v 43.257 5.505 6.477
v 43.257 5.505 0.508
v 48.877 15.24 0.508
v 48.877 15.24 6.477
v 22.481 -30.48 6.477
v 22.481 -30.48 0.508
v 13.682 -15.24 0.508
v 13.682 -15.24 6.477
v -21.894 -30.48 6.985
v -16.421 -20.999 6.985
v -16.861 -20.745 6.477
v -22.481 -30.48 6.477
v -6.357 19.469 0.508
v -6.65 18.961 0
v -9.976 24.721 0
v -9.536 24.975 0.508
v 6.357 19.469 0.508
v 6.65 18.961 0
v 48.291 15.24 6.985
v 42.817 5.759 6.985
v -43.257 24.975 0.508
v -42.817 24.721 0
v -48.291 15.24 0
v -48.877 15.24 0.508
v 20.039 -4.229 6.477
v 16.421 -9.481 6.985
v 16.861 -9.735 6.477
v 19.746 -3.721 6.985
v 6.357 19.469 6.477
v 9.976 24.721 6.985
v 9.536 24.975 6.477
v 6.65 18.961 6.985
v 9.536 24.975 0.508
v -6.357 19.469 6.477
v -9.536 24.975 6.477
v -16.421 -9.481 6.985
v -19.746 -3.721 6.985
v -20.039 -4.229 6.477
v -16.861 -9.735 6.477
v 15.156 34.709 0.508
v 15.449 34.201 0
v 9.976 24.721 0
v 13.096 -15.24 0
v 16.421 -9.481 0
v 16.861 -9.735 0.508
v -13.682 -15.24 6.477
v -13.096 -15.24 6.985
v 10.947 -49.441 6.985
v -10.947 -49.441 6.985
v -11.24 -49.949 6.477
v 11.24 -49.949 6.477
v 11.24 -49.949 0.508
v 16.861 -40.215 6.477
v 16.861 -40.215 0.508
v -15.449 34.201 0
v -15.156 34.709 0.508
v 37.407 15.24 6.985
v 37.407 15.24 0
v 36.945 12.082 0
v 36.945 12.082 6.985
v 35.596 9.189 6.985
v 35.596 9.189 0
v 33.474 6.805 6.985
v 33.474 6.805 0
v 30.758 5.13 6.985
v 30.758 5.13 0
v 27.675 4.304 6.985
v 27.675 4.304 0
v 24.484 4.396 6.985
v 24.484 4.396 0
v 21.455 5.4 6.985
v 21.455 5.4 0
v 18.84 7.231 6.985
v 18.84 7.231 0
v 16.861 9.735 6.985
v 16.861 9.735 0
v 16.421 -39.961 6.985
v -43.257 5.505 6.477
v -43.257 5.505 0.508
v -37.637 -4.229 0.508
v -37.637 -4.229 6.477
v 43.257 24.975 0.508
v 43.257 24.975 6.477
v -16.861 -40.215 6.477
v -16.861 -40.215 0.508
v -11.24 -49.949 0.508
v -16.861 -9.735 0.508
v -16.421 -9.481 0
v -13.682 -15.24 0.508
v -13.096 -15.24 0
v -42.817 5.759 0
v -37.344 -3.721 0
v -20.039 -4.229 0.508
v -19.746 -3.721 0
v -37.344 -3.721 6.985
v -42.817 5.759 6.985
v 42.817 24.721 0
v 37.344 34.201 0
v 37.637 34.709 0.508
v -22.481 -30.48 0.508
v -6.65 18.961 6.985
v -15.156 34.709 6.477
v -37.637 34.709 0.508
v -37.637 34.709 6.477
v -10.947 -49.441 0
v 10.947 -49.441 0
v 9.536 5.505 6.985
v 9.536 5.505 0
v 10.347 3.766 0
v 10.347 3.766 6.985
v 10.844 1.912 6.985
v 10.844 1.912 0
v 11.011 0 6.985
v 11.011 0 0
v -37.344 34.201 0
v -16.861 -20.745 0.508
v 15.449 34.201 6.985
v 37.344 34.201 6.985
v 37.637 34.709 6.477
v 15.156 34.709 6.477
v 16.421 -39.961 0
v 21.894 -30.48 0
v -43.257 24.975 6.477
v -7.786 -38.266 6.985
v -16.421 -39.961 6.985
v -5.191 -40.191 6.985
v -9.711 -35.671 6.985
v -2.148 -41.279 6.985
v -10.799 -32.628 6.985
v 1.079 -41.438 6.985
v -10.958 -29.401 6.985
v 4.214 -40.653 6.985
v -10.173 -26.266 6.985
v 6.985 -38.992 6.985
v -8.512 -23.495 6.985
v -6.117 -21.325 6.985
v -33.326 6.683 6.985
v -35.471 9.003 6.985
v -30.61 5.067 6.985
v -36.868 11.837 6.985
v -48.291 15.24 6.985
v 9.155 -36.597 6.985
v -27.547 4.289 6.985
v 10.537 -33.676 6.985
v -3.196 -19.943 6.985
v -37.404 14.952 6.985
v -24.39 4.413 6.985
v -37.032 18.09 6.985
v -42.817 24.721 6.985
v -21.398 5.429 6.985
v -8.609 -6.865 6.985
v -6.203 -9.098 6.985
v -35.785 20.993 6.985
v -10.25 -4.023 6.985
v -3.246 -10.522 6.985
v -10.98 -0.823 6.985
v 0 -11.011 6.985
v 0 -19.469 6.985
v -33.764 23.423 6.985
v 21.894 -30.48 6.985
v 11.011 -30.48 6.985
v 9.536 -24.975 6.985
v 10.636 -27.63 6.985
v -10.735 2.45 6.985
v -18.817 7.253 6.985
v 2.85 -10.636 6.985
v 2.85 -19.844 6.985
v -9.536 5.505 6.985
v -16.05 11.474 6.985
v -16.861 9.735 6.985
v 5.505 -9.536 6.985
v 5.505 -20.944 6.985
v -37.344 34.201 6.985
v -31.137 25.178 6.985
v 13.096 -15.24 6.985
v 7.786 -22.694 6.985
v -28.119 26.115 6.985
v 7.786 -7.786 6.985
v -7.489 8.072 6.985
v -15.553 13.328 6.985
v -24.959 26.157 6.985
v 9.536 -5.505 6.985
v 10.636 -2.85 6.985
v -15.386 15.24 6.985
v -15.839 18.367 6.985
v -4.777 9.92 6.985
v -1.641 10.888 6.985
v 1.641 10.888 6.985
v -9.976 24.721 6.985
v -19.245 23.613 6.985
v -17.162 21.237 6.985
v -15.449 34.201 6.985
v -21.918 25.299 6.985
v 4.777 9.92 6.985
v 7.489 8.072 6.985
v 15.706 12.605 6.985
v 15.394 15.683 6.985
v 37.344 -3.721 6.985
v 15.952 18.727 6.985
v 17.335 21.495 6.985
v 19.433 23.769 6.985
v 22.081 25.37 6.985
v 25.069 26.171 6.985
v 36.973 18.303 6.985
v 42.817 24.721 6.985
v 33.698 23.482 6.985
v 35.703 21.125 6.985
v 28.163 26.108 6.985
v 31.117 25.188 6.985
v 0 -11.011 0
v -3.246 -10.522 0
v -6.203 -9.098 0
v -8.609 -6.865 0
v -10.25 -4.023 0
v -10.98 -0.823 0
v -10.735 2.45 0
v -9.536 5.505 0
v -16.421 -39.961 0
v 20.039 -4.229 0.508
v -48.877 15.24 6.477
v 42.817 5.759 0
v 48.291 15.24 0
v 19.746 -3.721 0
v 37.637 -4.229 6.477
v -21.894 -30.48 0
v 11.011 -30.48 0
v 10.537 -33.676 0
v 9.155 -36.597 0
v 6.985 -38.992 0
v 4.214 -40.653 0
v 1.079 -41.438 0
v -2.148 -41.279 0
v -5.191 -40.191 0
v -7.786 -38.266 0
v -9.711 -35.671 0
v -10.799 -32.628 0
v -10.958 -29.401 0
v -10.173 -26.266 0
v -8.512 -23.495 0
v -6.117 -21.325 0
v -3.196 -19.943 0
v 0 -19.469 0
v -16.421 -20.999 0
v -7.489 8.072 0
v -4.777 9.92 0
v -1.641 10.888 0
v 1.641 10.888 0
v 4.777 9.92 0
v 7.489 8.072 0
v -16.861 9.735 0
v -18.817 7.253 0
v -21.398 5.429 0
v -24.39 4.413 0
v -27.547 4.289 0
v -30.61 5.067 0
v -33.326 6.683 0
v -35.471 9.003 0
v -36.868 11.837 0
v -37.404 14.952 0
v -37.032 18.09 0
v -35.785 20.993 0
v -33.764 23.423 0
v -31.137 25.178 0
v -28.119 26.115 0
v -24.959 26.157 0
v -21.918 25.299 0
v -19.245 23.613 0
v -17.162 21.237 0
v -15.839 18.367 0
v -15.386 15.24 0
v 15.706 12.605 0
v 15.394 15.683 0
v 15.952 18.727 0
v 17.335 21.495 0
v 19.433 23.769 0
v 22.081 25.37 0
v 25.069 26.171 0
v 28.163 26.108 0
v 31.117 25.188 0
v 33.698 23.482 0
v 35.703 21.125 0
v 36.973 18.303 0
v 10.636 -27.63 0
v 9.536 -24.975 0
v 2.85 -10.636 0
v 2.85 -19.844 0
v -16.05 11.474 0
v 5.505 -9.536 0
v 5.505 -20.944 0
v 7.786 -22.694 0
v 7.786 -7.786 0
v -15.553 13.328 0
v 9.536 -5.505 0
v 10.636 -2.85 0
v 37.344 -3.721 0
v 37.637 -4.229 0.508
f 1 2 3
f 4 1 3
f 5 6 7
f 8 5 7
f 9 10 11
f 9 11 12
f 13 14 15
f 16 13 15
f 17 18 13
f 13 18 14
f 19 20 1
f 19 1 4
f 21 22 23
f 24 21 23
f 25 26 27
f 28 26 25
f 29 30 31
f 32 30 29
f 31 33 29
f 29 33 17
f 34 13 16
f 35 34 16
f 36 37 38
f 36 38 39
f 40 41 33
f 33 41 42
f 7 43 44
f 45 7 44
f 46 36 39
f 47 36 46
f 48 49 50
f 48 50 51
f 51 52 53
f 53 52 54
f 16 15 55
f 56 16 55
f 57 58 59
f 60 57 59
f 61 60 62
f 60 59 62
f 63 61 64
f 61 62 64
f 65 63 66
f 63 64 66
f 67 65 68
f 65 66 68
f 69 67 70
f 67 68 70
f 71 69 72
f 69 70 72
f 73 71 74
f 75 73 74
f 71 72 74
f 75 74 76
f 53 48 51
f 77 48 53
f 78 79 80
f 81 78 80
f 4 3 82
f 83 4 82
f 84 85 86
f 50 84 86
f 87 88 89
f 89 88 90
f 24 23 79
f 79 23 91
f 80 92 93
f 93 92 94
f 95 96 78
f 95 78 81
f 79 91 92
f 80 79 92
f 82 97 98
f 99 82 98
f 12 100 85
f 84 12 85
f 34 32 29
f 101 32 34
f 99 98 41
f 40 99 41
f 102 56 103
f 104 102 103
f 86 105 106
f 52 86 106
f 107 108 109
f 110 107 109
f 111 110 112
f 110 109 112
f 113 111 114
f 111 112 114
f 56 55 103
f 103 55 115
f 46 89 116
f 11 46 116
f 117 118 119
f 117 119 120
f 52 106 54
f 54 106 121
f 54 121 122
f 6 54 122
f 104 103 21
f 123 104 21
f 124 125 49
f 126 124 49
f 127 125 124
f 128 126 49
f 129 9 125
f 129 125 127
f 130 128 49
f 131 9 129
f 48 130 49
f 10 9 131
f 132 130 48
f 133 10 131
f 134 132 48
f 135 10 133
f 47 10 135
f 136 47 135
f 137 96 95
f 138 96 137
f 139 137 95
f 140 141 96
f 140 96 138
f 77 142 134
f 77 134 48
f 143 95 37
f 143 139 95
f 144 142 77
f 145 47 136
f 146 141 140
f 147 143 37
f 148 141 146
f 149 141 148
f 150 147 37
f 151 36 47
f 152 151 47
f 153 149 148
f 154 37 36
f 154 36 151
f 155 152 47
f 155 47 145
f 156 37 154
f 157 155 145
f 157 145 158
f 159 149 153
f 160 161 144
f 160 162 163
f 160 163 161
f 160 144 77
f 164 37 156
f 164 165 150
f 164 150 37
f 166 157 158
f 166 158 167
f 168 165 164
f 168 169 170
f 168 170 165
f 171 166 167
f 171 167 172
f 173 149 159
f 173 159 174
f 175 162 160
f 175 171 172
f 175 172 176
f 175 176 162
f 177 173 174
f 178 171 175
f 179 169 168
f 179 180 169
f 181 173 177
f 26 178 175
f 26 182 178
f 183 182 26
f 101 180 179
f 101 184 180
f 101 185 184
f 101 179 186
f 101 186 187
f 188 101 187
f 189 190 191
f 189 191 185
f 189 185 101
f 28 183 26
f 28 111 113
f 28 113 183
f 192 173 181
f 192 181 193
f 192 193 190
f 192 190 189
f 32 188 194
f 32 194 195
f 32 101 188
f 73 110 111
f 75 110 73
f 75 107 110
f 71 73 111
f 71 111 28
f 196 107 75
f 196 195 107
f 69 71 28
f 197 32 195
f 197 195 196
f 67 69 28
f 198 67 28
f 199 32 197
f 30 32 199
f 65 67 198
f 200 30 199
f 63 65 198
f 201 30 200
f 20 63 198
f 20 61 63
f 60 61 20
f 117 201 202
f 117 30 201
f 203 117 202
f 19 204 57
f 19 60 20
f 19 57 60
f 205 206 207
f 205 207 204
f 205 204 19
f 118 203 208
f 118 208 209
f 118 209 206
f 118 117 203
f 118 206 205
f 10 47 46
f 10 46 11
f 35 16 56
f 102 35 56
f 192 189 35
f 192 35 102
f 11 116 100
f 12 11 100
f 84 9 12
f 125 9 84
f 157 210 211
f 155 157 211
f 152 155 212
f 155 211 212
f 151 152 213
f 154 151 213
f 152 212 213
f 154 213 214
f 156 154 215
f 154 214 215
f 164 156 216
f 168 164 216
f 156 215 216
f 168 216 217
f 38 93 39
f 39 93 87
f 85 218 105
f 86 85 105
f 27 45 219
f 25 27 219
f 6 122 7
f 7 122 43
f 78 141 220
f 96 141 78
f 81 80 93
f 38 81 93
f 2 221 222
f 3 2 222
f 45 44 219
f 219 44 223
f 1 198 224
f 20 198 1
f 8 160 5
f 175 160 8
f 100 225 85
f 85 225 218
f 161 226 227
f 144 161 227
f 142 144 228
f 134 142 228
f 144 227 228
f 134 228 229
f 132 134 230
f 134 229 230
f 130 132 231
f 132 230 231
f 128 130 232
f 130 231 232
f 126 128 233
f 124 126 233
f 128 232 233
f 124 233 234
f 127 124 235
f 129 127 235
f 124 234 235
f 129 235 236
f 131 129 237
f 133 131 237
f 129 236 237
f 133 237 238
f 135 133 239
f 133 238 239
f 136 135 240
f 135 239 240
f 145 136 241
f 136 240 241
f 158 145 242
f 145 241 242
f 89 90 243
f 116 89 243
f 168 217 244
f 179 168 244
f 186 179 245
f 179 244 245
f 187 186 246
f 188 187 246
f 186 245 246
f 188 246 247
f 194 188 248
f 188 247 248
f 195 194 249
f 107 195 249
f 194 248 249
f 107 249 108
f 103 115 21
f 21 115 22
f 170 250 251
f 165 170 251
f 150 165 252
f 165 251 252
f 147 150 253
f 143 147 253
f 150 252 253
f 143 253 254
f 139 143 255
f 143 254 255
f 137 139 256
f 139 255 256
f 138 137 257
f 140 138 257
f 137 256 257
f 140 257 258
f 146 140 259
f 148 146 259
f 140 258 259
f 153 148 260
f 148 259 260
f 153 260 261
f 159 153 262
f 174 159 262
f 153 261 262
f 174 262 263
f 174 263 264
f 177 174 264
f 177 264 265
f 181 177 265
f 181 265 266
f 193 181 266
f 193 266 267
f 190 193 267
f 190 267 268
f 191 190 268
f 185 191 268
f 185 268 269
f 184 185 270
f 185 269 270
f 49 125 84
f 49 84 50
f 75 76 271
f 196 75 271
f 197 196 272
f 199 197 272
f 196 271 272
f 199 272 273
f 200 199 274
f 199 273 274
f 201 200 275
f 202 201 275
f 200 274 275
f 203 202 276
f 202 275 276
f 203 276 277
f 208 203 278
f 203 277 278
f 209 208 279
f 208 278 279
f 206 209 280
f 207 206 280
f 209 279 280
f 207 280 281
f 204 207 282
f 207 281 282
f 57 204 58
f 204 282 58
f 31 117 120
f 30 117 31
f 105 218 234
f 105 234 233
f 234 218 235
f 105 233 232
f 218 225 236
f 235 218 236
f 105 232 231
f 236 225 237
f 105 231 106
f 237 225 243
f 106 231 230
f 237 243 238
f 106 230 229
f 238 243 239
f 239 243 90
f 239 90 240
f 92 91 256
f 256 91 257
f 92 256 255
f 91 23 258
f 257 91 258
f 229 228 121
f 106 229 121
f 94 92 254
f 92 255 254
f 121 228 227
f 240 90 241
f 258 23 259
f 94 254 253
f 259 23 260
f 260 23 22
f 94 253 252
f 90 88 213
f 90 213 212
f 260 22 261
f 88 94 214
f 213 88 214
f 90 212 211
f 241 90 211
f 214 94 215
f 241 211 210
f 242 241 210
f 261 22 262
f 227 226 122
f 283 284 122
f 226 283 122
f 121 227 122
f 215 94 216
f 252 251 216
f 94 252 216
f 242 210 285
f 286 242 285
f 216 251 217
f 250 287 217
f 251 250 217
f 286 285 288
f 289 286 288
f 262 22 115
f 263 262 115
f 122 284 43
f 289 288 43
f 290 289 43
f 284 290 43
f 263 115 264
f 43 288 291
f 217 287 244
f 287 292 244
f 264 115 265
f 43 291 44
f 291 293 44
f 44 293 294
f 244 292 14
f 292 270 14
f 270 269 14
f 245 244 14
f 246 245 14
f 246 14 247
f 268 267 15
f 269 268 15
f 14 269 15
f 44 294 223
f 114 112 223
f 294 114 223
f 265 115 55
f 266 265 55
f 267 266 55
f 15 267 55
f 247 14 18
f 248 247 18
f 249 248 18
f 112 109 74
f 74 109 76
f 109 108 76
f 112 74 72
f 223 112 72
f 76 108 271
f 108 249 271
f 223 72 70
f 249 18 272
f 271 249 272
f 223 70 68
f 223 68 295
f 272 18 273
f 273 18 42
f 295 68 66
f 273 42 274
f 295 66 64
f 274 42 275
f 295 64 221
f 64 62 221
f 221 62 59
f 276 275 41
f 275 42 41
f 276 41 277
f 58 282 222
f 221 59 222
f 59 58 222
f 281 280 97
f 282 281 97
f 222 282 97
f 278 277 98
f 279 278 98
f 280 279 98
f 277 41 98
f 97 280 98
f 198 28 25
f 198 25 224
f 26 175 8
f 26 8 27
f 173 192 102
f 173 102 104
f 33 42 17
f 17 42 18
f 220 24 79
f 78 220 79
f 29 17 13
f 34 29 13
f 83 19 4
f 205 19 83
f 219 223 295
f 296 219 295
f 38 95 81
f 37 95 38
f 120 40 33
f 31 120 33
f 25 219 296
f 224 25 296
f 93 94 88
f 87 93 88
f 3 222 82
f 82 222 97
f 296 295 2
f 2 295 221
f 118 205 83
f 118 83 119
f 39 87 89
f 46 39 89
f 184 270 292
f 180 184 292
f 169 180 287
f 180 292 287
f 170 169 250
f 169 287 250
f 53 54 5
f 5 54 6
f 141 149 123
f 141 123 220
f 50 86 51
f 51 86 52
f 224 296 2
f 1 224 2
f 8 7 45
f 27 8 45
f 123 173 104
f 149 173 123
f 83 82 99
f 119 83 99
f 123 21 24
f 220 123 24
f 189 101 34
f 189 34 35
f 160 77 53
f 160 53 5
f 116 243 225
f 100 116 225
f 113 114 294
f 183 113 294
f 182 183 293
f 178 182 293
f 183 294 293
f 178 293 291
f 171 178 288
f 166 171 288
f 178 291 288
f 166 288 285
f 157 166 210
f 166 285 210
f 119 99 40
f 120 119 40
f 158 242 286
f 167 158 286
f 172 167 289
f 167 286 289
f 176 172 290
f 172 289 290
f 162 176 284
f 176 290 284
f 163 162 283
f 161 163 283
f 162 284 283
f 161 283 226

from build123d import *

# Parameters (mm, degrees)
F1_DEPTH = 6.985
F2_SIZE  = 0.508


with BuildPart() as f1:
    # F0 (on Top) → F1 (new body)
    with BuildSketch(Plane.XY):
        with BuildLine():
            ThreePointArc((9.5357190946, 5.5054500415), (10.6357126745, 2.8498306468), (11.0109, 0))
            ThreePointArc((11.0109, 0), (7.7858820574, -7.7858820566), (1.1e-09, -11.0109))
            Line((1.1e-09, -11.0109), (11.2404901259, -11.0109))
            Line((11.2404901259, -11.0109), (13.1646205371, -14.3435916326))
            ThreePointArc((13.1646205371, -14.3435916326), (15.1885256674, -12.180087966), (16.8607351436, -9.7345500784))
            ThreePointArc((16.8607351436, -9.7345500784), (18.1425283998, -7.0636051754), (19.0042250039, -4.2291))
            Line((19.0042250039, -4.2291), (15.1559641815, -4.2291))
            Line((15.1559641815, -4.2291), (9.5357190946, 5.5054500415))
        make_face()
        with BuildLine():
            ThreePointArc((-9.5357191578, 5.5054499319), (-6.32e-08, 11.0109), (9.5357190946, 5.5054500415))
            Line((9.5357190946, 5.5054500415), (3.9154740556, 15.24))
            Line((3.9154740556, 15.24), (5.8396044668, 18.5726916326))
            ThreePointArc((5.8396044668, 18.5726916326), (2.9540027205, 19.2436930639), (0, 19.4691))
            ThreePointArc((0, 19.4691), (-2.9540027205, 19.2436930639), (-5.8396044668, 18.5726916326))
            Line((-5.8396044668, 18.5726916326), (-3.9154740556, 15.24))
            Line((-3.9154740556, 15.24), (-9.5357191578, 5.5054499319))
        make_face()
        with BuildLine():
            Line((-11.2404901259, -11.0109), (1.1e-09, -11.0109))
            ThreePointArc((1.1e-09, -11.0109), (-9.5357190986, -5.5054500345), (-9.5357191578, 5.5054499319))
            Line((-9.5357191578, 5.5054499319), (-15.1559641815, -4.2291))
            Line((-15.1559641815, -4.2291), (-19.0042250039, -4.2291))
            ThreePointArc((-19.0042250039, -4.2291), (-18.1425283538, -7.0636052934), (-16.8607350169, -9.7345502977))
            ThreePointArc((-16.8607350169, -9.7345502977), (-15.1885255882, -12.1800880648), (-13.1646205371, -14.3435916326))
            Line((-13.1646205371, -14.3435916326), (-11.2404901259, -11.0109))
        make_face()
        with BuildLine():
            Line((11.2404901259, 19.4691), (16.8607351393, 9.7345500857))
            Line((16.8607351393, 9.7345500857), (22.4809802518, 0))
            Line((22.4809802518, 0), (20.5568498405, -3.3326916326))
            ThreePointArc((20.5568498405, -3.3326916326), (23.4424515869, -4.0036930639), (26.3964543074, -4.2291))
            ThreePointArc((26.3964543074, -4.2291), (36.1310042357, -1.6207352302), (43.2571894135, 5.5054498567))
            ThreePointArc((43.2571894135, 5.5054498567), (45.2021607905, 10.2010260491), (45.8655543073, 15.24))
            ThreePointArc((45.8655543073, 15.24), (45.2021608159, 20.2789738562), (43.2571895115, 24.9745499735))
            ThreePointArc((43.2571895115, 24.9745499735), (36.1310043206, 32.1007351812), (26.3964543074, 34.7091))
            ThreePointArc((26.3964543074, 34.7091), (16.6619043065, 32.1007351883), (9.5357191175, 24.9745499982))
            ThreePointArc((9.5357191175, 24.9745499982), (8.2539258908, 22.3036051322), (7.3922293034, 19.4691))
            Line((7.3922293034, 19.4691), (11.2404901259, 19.4691))
        make_face()
        with BuildLine():
            ThreePointArc((37.4073543073, 15.24), (29.2462848833, 4.6042873065), (16.8607351393, 9.7345500857))
            ThreePointArc((16.8607351393, 9.7345500857), (23.5466237314, 25.8757126935), (37.4073543073, 15.24))
        make_face(mode=Mode.SUBTRACT)
        with BuildLine():
            ThreePointArc((5.8396044668, 18.5726916326), (6.4940895018, 18.3540909977), (7.1404170128, 18.1124349465))
            ThreePointArc((7.1404170128, 18.1124349465), (7.2543004891, 18.7929990159), (7.3922293034, 19.4691))
            Line((7.3922293034, 19.4691), (6.357146079, 19.4691))
            Line((6.357146079, 19.4691), (5.8396044668, 18.5726916326))
        make_face()
        with BuildLine():
            ThreePointArc((20.5568498405, -3.3326916326), (19.9023648056, -3.1140909977), (19.2560372945, -2.8724349465))
            ThreePointArc((19.2560372945, -2.8724349465), (19.1421538183, -3.5529990159), (19.0042250039, -4.2291))
            Line((19.0042250039, -4.2291), (20.0393082283, -4.2291))
            Line((20.0393082283, -4.2291), (20.5568498405, -3.3326916326))
        make_face()
        with BuildLine():
            Line((11.2404901259, -19.4691), (8.1e-09, -19.4691))
            Line((8.1e-09, -19.4691), (-11.2404901259, -19.4691))
            Line((-11.2404901259, -19.4691), (-13.1646205371, -16.1364083674))
            ThreePointArc((-13.1646205371, -16.1364083674), (-15.1885255682, -18.2999119102), (-16.8607349849, -20.7454496469))
            ThreePointArc((-16.8607349849, -20.7454496469), (-19.4691, -30.4800000374), (-16.8607349475, -40.214550418))
            ThreePointArc((-16.8607349475, -40.214550418), (-9.734549801, -47.3407353037), (-2.3e-08, -49.9491))
            ThreePointArc((-2.3e-08, -49.9491), (9.7345501407, -47.3407351076), (16.8607353627, -40.2145496988))
            ThreePointArc((16.8607353627, -40.2145496988), (18.8057065496, -35.518973703), (19.4691, -30.48))
            ThreePointArc((19.4691, -30.48), (18.8057064421, -25.4410258959), (16.8607349475, -20.745449582))
            ThreePointArc((16.8607349475, -20.745449582), (15.1885255448, -18.299911881), (13.1646205371, -16.1364083674))
            Line((13.1646205371, -16.1364083674), (11.2404901259, -19.4691))
        make_face()
        with BuildLine():
            ThreePointArc((11.0109, -30.48), (-7.7858820598, -38.2658820541), (8.1e-09, -19.4691))
            ThreePointArc((8.1e-09, -19.4691), (7.7858820598, -22.6941179459), (11.0109, -30.48))
        make_face(mode=Mode.SUBTRACT)
        with BuildLine():
            ThreePointArc((13.1646205371, -14.3435916326), (12.6480643165, -14.8010919819), (12.1156202817, -15.24))
            ThreePointArc((12.1156202817, -15.24), (12.6480643165, -15.6789080181), (13.1646205371, -16.1364083674))
            Line((13.1646205371, -16.1364083674), (13.6821621493, -15.24))
            Line((13.6821621493, -15.24), (13.1646205371, -14.3435916326))
        make_face()
        with BuildLine():
            ThreePointArc((-13.1646205371, -16.1364083674), (-12.6480643165, -15.6789080181), (-12.1156202817, -15.24))
            ThreePointArc((-12.1156202817, -15.24), (-12.6480643165, -14.8010919819), (-13.1646205371, -14.3435916326))
            Line((-13.1646205371, -14.3435916326), (-13.6821621493, -15.24))
            Line((-13.6821621493, -15.24), (-13.1646205371, -16.1364083674))
        make_face()
        with BuildLine():
            Line((-22.4809802518, 0), (-16.8607351415, 9.7345500819))
            Line((-16.8607351415, 9.7345500819), (-11.2404901259, 19.4691))
            Line((-11.2404901259, 19.4691), (-7.3922293034, 19.4691))
            ThreePointArc((-7.3922293034, 19.4691), (-8.2539258856, 22.3036051189), (-9.5357191032, 24.9745499735))
            ThreePointArc((-9.5357191032, 24.9745499735), (-16.6619042941, 32.1007351812), (-26.3964543073, 34.7091))
            ThreePointArc((-26.3964543073, 34.7091), (-36.1310043206, 32.1007351812), (-43.2571895115, 24.9745499735))
            ThreePointArc((-43.2571895115, 24.9745499735), (-45.8655543073, 15.2399997434), (-43.2571892549, 5.505449582))
            ThreePointArc((-43.2571892549, 5.505449582), (-36.1310040984, -1.6207353095), (-26.3964543073, -4.2291))
            ThreePointArc((-26.3964543073, -4.2291), (-23.4424515869, -4.0036930639), (-20.5568498405, -3.3326916326))
            Line((-20.5568498405, -3.3326916326), (-22.4809802518, 0))
        make_face()
        with BuildLine():
            ThreePointArc((-15.3855543073, 15.24), (-15.7607416144, 12.390169422), (-16.8607351415, 9.7345500819))
            ThreePointArc((-16.8607351415, 9.7345500819), (-37.0321670003, 18.089830578), (-15.3855543073, 15.24))
        make_face(mode=Mode.SUBTRACT)
        with BuildLine():
            ThreePointArc((-19.0042250039, -4.2291), (-19.1421538183, -3.5529990159), (-19.2560372945, -2.8724349465))
            ThreePointArc((-19.2560372945, -2.8724349465), (-19.9023648056, -3.1140909977), (-20.5568498405, -3.3326916326))
            Line((-20.5568498405, -3.3326916326), (-20.0393082283, -4.2291))
            Line((-20.0393082283, -4.2291), (-19.0042250039, -4.2291))
        make_face()
        with BuildLine():
            ThreePointArc((0, 19.4691), (2.9540027205, 19.2436930639), (5.8396044668, 18.5726916326))
            Line((5.8396044668, 18.5726916326), (6.357146079, 19.4691))
            Line((6.357146079, 19.4691), (0, 19.4691))
        make_face()
        with BuildLine():
            Line((6.357146079, 19.4691), (7.3922293034, 19.4691))
            ThreePointArc((7.3922293034, 19.4691), (8.2539258908, 22.3036051322), (9.5357191175, 24.9745499982))
            Line((9.5357191175, 24.9745499982), (6.357146079, 19.4691))
        make_face()
        with BuildLine():
            Line((20.0393082283, -4.2291), (19.0042250039, -4.2291))
            ThreePointArc((19.0042250039, -4.2291), (18.1425283998, -7.0636051754), (16.8607351436, -9.7345500784))
            Line((16.8607351436, -9.7345500784), (20.0393082283, -4.2291))
        make_face()
        with BuildLine():
            ThreePointArc((26.3964543074, -4.2291), (23.4424515869, -4.0036930639), (20.5568498405, -3.3326916326))
            Line((20.5568498405, -3.3326916326), (20.0393082283, -4.2291))
            Line((20.0393082283, -4.2291), (26.3964543074, -4.2291))
        make_face()
        with BuildLine():
            ThreePointArc((16.8607351436, -9.7345500784), (15.1885256674, -12.180087966), (13.1646205371, -14.3435916326))
            Line((13.1646205371, -14.3435916326), (13.6821621493, -15.24))
            Line((13.6821621493, -15.24), (16.8607351436, -9.7345500784))
        make_face()
        with BuildLine():
            Line((13.6821621493, -15.24), (13.1646205371, -16.1364083674))
            ThreePointArc((13.1646205371, -16.1364083674), (15.1885255448, -18.299911881), (16.8607349475, -20.745449582))
            Line((16.8607349475, -20.745449582), (13.6821621493, -15.24))
        make_face()
        with BuildLine():
            Line((-13.6821621493, -15.24), (-13.1646205371, -14.3435916326))
            ThreePointArc((-13.1646205371, -14.3435916326), (-15.1885255882, -12.1800880648), (-16.8607350169, -9.7345502977))
            Line((-16.8607350169, -9.7345502977), (-13.6821621493, -15.24))
        make_face()
        with BuildLine():
            ThreePointArc((-16.8607349849, -20.7454496469), (-15.1885255682, -18.2999119102), (-13.1646205371, -16.1364083674))
            Line((-13.1646205371, -16.1364083674), (-13.6821621493, -15.24))
            Line((-13.6821621493, -15.24), (-16.8607349849, -20.7454496469))
        make_face()
        with BuildLine():
            ThreePointArc((-7.3922293034, 19.4691), (-7.2543004891, 18.7929990159), (-7.1404170128, 18.1124349465))
            ThreePointArc((-7.1404170128, 18.1124349465), (-6.4940895018, 18.3540909977), (-5.8396044668, 18.5726916326))
            Line((-5.8396044668, 18.5726916326), (-6.357146079, 19.4691))
            Line((-6.357146079, 19.4691), (-7.3922293034, 19.4691))
        make_face()
        with BuildLine():
            Line((-20.0393082283, -4.2291), (-20.5568498405, -3.3326916326))
            ThreePointArc((-20.5568498405, -3.3326916326), (-23.4424515869, -4.0036930639), (-26.3964543073, -4.2291))
            Line((-26.3964543073, -4.2291), (-20.0393082283, -4.2291))
        make_face()
        with BuildLine():
            ThreePointArc((-16.8607350169, -9.7345502977), (-18.1425283538, -7.0636052934), (-19.0042250039, -4.2291))
            Line((-19.0042250039, -4.2291), (-20.0393082283, -4.2291))
            Line((-20.0393082283, -4.2291), (-16.8607350169, -9.7345502977))
        make_face()
        with BuildLine():
            Line((-6.357146079, 19.4691), (-5.8396044668, 18.5726916326))
            ThreePointArc((-5.8396044668, 18.5726916326), (-2.9540027205, 19.2436930639), (0, 19.4691))
            Line((0, 19.4691), (-6.357146079, 19.4691))
        make_face()
        with BuildLine():
            Line((15.1559641815, 34.7091), (9.5357191175, 24.9745499982))
            ThreePointArc((9.5357191175, 24.9745499982), (16.6619043065, 32.1007351883), (26.3964543074, 34.7091))
            Line((26.3964543074, 34.7091), (15.1559641815, 34.7091))
        make_face()
        with BuildLine():
            ThreePointArc((43.2571894135, 5.5054498567), (36.1310042357, -1.6207352302), (26.3964543074, -4.2291))
            Line((26.3964543074, -4.2291), (37.6369444332, -4.2291))
            Line((37.6369444332, -4.2291), (43.2571894135, 5.5054498567))
        make_face()
        with BuildLine():
            Line((22.4809802518, -30.48), (16.8607349475, -20.745449582))
            ThreePointArc((16.8607349475, -20.745449582), (18.8057064421, -25.4410258959), (19.4691, -30.48))
            ThreePointArc((19.4691, -30.48), (18.8057065496, -35.518973703), (16.8607353627, -40.2145496988))
            Line((16.8607353627, -40.2145496988), (22.4809802518, -30.48))
        make_face()
        with BuildLine():
            ThreePointArc((-16.8607349475, -40.214550418), (-19.4691, -30.4800000374), (-16.8607349849, -20.7454496469))
            Line((-16.8607349849, -20.7454496469), (-22.4809802518, -30.48))
            Line((-22.4809802518, -30.48), (-16.8607349475, -40.214550418))
        make_face()
        with BuildLine():
            ThreePointArc((-9.5357191032, 24.9745499735), (-8.2539258856, 22.3036051189), (-7.3922293034, 19.4691))
            Line((-7.3922293034, 19.4691), (-6.357146079, 19.4691))
            Line((-6.357146079, 19.4691), (-9.5357191032, 24.9745499735))
        make_face()
        with BuildLine():
            Line((-37.6369444332, -4.2291), (-26.3964543073, -4.2291))
            ThreePointArc((-26.3964543073, -4.2291), (-36.1310040984, -1.6207353095), (-43.2571892549, 5.505449582))
            Line((-43.2571892549, 5.505449582), (-37.6369444332, -4.2291))
        make_face()
        with BuildLine():
            Line((37.6369444332, 34.7091), (26.3964543074, 34.7091))
            ThreePointArc((26.3964543074, 34.7091), (36.1310043206, 32.1007351812), (43.2571895115, 24.9745499735))
            Line((43.2571895115, 24.9745499735), (37.6369444332, 34.7091))
        make_face()
        with BuildLine():
            ThreePointArc((45.8655543073, 15.24), (45.2021607905, 10.2010260491), (43.2571894135, 5.5054498567))
            Line((43.2571894135, 5.5054498567), (48.8774345591, 15.24))
            Line((48.8774345591, 15.24), (43.2571895115, 24.9745499735))
            ThreePointArc((43.2571895115, 24.9745499735), (45.2021608159, 20.2789738562), (45.8655543073, 15.24))
        make_face()
        with BuildLine():
            ThreePointArc((-2.3e-08, -49.9491), (-9.734549801, -47.3407353037), (-16.8607349475, -40.214550418))
            Line((-16.8607349475, -40.214550418), (-11.2404901259, -49.9491))
            Line((-11.2404901259, -49.9491), (-2.3e-08, -49.9491))
        make_face()
        with BuildLine():
            ThreePointArc((-26.3964543073, 34.7091), (-16.6619042941, 32.1007351812), (-9.5357191032, 24.9745499735))
            Line((-9.5357191032, 24.9745499735), (-15.1559641815, 34.7091))
            Line((-15.1559641815, 34.7091), (-26.3964543073, 34.7091))
        make_face()
        with BuildLine():
            Line((-48.8774345591, 15.24), (-43.2571892549, 5.505449582))
            ThreePointArc((-43.2571892549, 5.505449582), (-45.8655543073, 15.2399997434), (-43.2571895115, 24.9745499735))
            Line((-43.2571895115, 24.9745499735), (-48.8774345591, 15.24))
        make_face()
        with BuildLine():
            Line((11.2404901259, -49.9491), (16.8607353627, -40.2145496988))
            ThreePointArc((16.8607353627, -40.2145496988), (9.7345501407, -47.3407351076), (-2.3e-08, -49.9491))
            Line((-2.3e-08, -49.9491), (11.2404901259, -49.9491))
        make_face()
        with BuildLine():
            ThreePointArc((-43.2571895115, 24.9745499735), (-36.1310043206, 32.1007351812), (-26.3964543073, 34.7091))
            Line((-26.3964543073, 34.7091), (-37.6369444332, 34.7091))
            Line((-37.6369444332, 34.7091), (-43.2571895115, 24.9745499735))
        make_face()
        with BuildLine():
            ThreePointArc((12.1156202817, -15.24), (6.4162594564, -12.0985563843), (1.1e-09, -11.0109))
            Line((0, -11.0109), (0, -19.4691))
            ThreePointArc((8.1e-09, -19.4691), (6.4162594597, -18.3814436146), (12.1156202817, -15.24))
        make_face()
        with BuildLine():
            Line((11.2404901259, -11.0109), (1.1e-09, -11.0109))
            ThreePointArc((1.1e-09, -11.0109), (6.4162594564, -12.0985563843), (12.1156202817, -15.24))
            ThreePointArc((12.1156202817, -15.24), (12.6480643165, -14.8010919819), (13.1646205371, -14.3435916326))
            Line((13.1646205371, -14.3435916326), (11.2404901259, -11.0109))
        make_face()
        with BuildLine():
            ThreePointArc((12.1156202817, -15.24), (6.4162594597, -18.3814436146), (8.1e-09, -19.4691))
            Line((8.1e-09, -19.4691), (11.2404901259, -19.4691))
            Line((11.2404901259, -19.4691), (13.1646205371, -16.1364083674))
            ThreePointArc((13.1646205371, -16.1364083674), (12.6480643165, -15.6789080181), (12.1156202817, -15.24))
        make_face()
        with BuildLine():
            Line((0, -19.4691), (0, -11.0109))
            ThreePointArc((1.1e-09, -11.0109), (-6.4162594553, -12.0985563839), (-12.1156202817, -15.24))
            ThreePointArc((-12.1156202817, -15.24), (-6.416259452, -18.3814436173), (8.1e-09, -19.4691))
        make_face()
        with BuildLine():
            Line((-11.2404901259, -19.4691), (8.1e-09, -19.4691))
            ThreePointArc((8.1e-09, -19.4691), (-6.416259452, -18.3814436173), (-12.1156202817, -15.24))
            ThreePointArc((-12.1156202817, -15.24), (-12.6480643165, -15.6789080181), (-13.1646205371, -16.1364083674))
            Line((-13.1646205371, -16.1364083674), (-11.2404901259, -19.4691))
        make_face()
        with BuildLine():
            ThreePointArc((-12.1156202817, -15.24), (-6.4162594553, -12.0985563839), (1.1e-09, -11.0109))
            Line((1.1e-09, -11.0109), (-11.2404901259, -11.0109))
            Line((-11.2404901259, -11.0109), (-13.1646205371, -14.3435916326))
            ThreePointArc((-13.1646205371, -14.3435916326), (-12.6480643165, -14.8010919819), (-12.1156202817, -15.24))
        make_face()
        with BuildLine():
            Line((16.8607351888, 9.73455), (9.5357191185, 5.50545))
            ThreePointArc((9.5357190946, 5.5054500415), (13.6857868875, 0.4926345216), (19.2560372945, -2.8724349465))
            ThreePointArc((19.2560372945, -2.8724349465), (19.4157612586, -1.4401630323), (19.4691, 0))
            ThreePointArc((19.4691, 0), (18.8057064918, 5.0389739188), (16.8607351393, 9.7345500857))
        make_face()
        with BuildLine():
            ThreePointArc((7.1404170128, 18.1124349465), (7.2695274453, 11.6059219016), (9.5357190946, 5.5054500415))
            Line((9.5357191185, 5.50545), (16.8607351888, 9.73455))
            ThreePointArc((16.8607351393, 9.7345500857), (12.7106673642, 14.7473655263), (7.1404170128, 18.1124349465))
        make_face()
        with BuildLine():
            ThreePointArc((7.1404170128, 18.1124349465), (12.7106673642, 14.7473655263), (16.8607351393, 9.7345500857))
            Line((16.8607351393, 9.7345500857), (11.2404901259, 19.4691))
            Line((11.2404901259, 19.4691), (7.3922293034, 19.4691))
            ThreePointArc((7.3922293034, 19.4691), (7.2543004891, 18.7929990159), (7.1404170128, 18.1124349465))
        make_face()
        with BuildLine():
            Line((-16.8607351888, 9.73455), (-9.5357191185, 5.50545))
            ThreePointArc((-9.5357191578, 5.5054499319), (-7.5907478129, 10.201026091), (-6.9273543073, 15.24))
            ThreePointArc((-6.9273543073, 15.24), (-6.9806930488, 16.6801630323), (-7.1404170128, 18.1124349465))
            ThreePointArc((-7.1404170128, 18.1124349465), (-12.7106673658, 14.7473655249), (-16.8607351415, 9.7345500819))
        make_face()
        with BuildLine():
            Line((-11.2404901259, 19.4691), (-16.8607351415, 9.7345500819))
            ThreePointArc((-16.8607351415, 9.7345500819), (-12.7106673658, 14.7473655249), (-7.1404170128, 18.1124349465))
            ThreePointArc((-7.1404170128, 18.1124349465), (-7.2543004891, 18.7929990159), (-7.3922293034, 19.4691))
            Line((-7.3922293034, 19.4691), (-11.2404901259, 19.4691))
        make_face()
        with BuildLine():
            ThreePointArc((-6.9273543073, 15.24), (-7.5907478129, 10.201026091), (-9.5357191578, 5.5054499319))
            Line((-9.5357191578, 5.5054499319), (-3.9154740556, 15.24))
            Line((-3.9154740556, 15.24), (-5.8396044668, 18.5726916326))
            ThreePointArc((-5.8396044668, 18.5726916326), (-6.4940895018, 18.3540909977), (-7.1404170128, 18.1124349465))
            ThreePointArc((-7.1404170128, 18.1124349465), (-6.9806930488, 16.6801630323), (-6.9273543073, 15.24))
        make_face()
        with BuildLine():
            ThreePointArc((-19.2560372945, -2.8724349465), (-19.1269268487, 3.6340781684), (-16.8607351415, 9.7345500819))
            Line((-16.8607351415, 9.7345500819), (-22.4809802518, 0))
            Line((-22.4809802518, 0), (-20.5568498405, -3.3326916326))
            ThreePointArc((-20.5568498405, -3.3326916326), (-19.9023648056, -3.1140909977), (-19.2560372945, -2.8724349465))
        make_face()
        with BuildLine():
            Line((-15.1559641815, -4.2291), (-9.5357191578, 5.5054499319))
            ThreePointArc((-9.5357191578, 5.5054499319), (-13.6857869354, 0.4926344803), (-19.2560372945, -2.8724349465))
            ThreePointArc((-19.2560372945, -2.8724349465), (-19.1421538183, -3.5529990159), (-19.0042250039, -4.2291))
            Line((-19.0042250039, -4.2291), (-15.1559641815, -4.2291))
        make_face()
        with BuildLine():
            Line((3.9154740556, 15.24), (9.5357190946, 5.5054500415))
            ThreePointArc((9.5357190946, 5.5054500415), (7.2695274453, 11.6059219016), (7.1404170128, 18.1124349465))
            ThreePointArc((7.1404170128, 18.1124349465), (6.4940895018, 18.3540909977), (5.8396044668, 18.5726916326))
            Line((5.8396044668, 18.5726916326), (3.9154740556, 15.24))
        make_face()
        with BuildLine():
            ThreePointArc((-19.2560372945, -2.8724349465), (-13.6857869354, 0.4926344803), (-9.5357191578, 5.5054499319))
            Line((-9.5357191185, 5.50545), (-16.8607351888, 9.73455))
            ThreePointArc((-16.8607351415, 9.7345500819), (-19.1269268487, 3.6340781684), (-19.2560372945, -2.8724349465))
        make_face()
        with BuildLine():
            ThreePointArc((19.2560372945, -2.8724349465), (13.6857868875, 0.4926345216), (9.5357190946, 5.5054500415))
            Line((9.5357190946, 5.5054500415), (15.1559641815, -4.2291))
            Line((15.1559641815, -4.2291), (19.0042250039, -4.2291))
            ThreePointArc((19.0042250039, -4.2291), (19.1421538183, -3.5529990159), (19.2560372945, -2.8724349465))
        make_face()
        with BuildLine():
            Line((22.4809802518, 0), (16.8607351393, 9.7345500857))
            ThreePointArc((16.8607351393, 9.7345500857), (18.8057064918, 5.0389739188), (19.4691, 0))
            ThreePointArc((19.4691, 0), (19.4157612586, -1.4401630323), (19.2560372945, -2.8724349465))
            ThreePointArc((19.2560372945, -2.8724349465), (19.9023648056, -3.1140909977), (20.5568498405, -3.3326916326))
            Line((20.5568498405, -3.3326916326), (22.4809802518, 0))
        make_face()
    extrude(amount=F1_DEPTH)

    # F2
    f2_edges = [f1.edges().sort_by_distance(p)[0] for p in [
        (-43.257189, 24.97455, 6.985),
        (-26.396454, 34.7091, 6.985),
        (-10.756555, 27.0891, 6.985),
        (0, 19.4691, 6.985),
        (10.756555, 27.0891, 6.985),
        (26.396454, 34.7091, 6.985),
        (43.257189, 24.97455, 6.985),
        (43.257189, 5.50545, 6.985),
        (28.838126, -4.2291, 6.985),
        (16.860735, -9.73455, 6.985),
        (18.081571, -22.86, 6.985),
        (16.860735, -40.21455, 6.985),
        (0, -49.9491, 6.985),
        (-16.860735, -40.21455, 6.985),
        (-18.081571, -22.86, 6.985),
        (-16.860735, -9.73455, 6.985),
        (-28.838126, -4.2291, 6.985),
        (-43.257189, 5.50545, 6.985),
        (43.257189, 24.97455, 0),
        (26.396454, 34.7091, 0),
        (10.756555, 27.0891, 0),
        (0, 19.4691, 0),
        (43.257189, 5.50545, 0),
        (28.838126, -4.2291, 0),
        (16.860735, -9.73455, 0),
        (18.081571, -22.86, 0),
        (16.860735, -40.21455, 0),
        (0, -49.9491, 0),
        (-16.860735, -40.21455, 0),
        (-18.081571, -22.86, 0),
        (-16.860735, -9.73455, 0),
        (-28.838126, -4.2291, 0),
        (-43.257189, 5.50545, 0),
        (-43.257189, 24.97455, 0),
        (-26.396454, 34.7091, 0),
        (-10.756555, 27.0891, 0),
    ]]
    chamfer(f2_edges, length=F2_SIZE)


solid = f1.part
